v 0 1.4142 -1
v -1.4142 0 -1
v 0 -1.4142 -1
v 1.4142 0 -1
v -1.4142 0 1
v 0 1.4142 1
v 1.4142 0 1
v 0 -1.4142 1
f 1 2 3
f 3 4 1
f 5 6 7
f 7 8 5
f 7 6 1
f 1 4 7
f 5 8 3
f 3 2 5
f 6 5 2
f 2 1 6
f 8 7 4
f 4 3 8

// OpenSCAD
cube_vertices =
[
    [-1, -1, -1],
    [-1, +1, -1],
    [+1, +1, -1],
    [+1, -1, -1],

    [-1, -1, +1],
    [-1, +1, +1],
    [+1, +1, +1],
    [+1, -1, +1]
];

cube_faces =
[
    [0, 1, 2],  [2, 3, 0], // -z
    [7, 6 ,5],  [5, 4, 7], // +z
    [2, 6, 7],  [7, 3 ,2], // +x
    [0, 4, 5],  [5, 1, 0], // -x
    [1, 5, 6],  [6, 2, 1], // +y
    [3, 7, 4],  [4, 0, 3]  // -y
];

tr =
[
    [1, -1, 0, 0]/sqrt(2),
    [1, 1, 0, 0]/sqrt(2),
    [0, 0, 1, 0],
    [0, 0, 0, 1]
];

b = tr * [10, 10, 10, 1];

echo(b);

function transform_vertices(vs, m) = [
    for (i = [0:len(vs)-1])
    let (t = m * [vs[i][0], vs[i][1], vs[i][2], 1])
    [t[0], t[1], t[2]] / t[3]
];

color("turquoise")
polyhedron(points = transform_vertices(cube_vertices, tr), faces = cube_faces);
